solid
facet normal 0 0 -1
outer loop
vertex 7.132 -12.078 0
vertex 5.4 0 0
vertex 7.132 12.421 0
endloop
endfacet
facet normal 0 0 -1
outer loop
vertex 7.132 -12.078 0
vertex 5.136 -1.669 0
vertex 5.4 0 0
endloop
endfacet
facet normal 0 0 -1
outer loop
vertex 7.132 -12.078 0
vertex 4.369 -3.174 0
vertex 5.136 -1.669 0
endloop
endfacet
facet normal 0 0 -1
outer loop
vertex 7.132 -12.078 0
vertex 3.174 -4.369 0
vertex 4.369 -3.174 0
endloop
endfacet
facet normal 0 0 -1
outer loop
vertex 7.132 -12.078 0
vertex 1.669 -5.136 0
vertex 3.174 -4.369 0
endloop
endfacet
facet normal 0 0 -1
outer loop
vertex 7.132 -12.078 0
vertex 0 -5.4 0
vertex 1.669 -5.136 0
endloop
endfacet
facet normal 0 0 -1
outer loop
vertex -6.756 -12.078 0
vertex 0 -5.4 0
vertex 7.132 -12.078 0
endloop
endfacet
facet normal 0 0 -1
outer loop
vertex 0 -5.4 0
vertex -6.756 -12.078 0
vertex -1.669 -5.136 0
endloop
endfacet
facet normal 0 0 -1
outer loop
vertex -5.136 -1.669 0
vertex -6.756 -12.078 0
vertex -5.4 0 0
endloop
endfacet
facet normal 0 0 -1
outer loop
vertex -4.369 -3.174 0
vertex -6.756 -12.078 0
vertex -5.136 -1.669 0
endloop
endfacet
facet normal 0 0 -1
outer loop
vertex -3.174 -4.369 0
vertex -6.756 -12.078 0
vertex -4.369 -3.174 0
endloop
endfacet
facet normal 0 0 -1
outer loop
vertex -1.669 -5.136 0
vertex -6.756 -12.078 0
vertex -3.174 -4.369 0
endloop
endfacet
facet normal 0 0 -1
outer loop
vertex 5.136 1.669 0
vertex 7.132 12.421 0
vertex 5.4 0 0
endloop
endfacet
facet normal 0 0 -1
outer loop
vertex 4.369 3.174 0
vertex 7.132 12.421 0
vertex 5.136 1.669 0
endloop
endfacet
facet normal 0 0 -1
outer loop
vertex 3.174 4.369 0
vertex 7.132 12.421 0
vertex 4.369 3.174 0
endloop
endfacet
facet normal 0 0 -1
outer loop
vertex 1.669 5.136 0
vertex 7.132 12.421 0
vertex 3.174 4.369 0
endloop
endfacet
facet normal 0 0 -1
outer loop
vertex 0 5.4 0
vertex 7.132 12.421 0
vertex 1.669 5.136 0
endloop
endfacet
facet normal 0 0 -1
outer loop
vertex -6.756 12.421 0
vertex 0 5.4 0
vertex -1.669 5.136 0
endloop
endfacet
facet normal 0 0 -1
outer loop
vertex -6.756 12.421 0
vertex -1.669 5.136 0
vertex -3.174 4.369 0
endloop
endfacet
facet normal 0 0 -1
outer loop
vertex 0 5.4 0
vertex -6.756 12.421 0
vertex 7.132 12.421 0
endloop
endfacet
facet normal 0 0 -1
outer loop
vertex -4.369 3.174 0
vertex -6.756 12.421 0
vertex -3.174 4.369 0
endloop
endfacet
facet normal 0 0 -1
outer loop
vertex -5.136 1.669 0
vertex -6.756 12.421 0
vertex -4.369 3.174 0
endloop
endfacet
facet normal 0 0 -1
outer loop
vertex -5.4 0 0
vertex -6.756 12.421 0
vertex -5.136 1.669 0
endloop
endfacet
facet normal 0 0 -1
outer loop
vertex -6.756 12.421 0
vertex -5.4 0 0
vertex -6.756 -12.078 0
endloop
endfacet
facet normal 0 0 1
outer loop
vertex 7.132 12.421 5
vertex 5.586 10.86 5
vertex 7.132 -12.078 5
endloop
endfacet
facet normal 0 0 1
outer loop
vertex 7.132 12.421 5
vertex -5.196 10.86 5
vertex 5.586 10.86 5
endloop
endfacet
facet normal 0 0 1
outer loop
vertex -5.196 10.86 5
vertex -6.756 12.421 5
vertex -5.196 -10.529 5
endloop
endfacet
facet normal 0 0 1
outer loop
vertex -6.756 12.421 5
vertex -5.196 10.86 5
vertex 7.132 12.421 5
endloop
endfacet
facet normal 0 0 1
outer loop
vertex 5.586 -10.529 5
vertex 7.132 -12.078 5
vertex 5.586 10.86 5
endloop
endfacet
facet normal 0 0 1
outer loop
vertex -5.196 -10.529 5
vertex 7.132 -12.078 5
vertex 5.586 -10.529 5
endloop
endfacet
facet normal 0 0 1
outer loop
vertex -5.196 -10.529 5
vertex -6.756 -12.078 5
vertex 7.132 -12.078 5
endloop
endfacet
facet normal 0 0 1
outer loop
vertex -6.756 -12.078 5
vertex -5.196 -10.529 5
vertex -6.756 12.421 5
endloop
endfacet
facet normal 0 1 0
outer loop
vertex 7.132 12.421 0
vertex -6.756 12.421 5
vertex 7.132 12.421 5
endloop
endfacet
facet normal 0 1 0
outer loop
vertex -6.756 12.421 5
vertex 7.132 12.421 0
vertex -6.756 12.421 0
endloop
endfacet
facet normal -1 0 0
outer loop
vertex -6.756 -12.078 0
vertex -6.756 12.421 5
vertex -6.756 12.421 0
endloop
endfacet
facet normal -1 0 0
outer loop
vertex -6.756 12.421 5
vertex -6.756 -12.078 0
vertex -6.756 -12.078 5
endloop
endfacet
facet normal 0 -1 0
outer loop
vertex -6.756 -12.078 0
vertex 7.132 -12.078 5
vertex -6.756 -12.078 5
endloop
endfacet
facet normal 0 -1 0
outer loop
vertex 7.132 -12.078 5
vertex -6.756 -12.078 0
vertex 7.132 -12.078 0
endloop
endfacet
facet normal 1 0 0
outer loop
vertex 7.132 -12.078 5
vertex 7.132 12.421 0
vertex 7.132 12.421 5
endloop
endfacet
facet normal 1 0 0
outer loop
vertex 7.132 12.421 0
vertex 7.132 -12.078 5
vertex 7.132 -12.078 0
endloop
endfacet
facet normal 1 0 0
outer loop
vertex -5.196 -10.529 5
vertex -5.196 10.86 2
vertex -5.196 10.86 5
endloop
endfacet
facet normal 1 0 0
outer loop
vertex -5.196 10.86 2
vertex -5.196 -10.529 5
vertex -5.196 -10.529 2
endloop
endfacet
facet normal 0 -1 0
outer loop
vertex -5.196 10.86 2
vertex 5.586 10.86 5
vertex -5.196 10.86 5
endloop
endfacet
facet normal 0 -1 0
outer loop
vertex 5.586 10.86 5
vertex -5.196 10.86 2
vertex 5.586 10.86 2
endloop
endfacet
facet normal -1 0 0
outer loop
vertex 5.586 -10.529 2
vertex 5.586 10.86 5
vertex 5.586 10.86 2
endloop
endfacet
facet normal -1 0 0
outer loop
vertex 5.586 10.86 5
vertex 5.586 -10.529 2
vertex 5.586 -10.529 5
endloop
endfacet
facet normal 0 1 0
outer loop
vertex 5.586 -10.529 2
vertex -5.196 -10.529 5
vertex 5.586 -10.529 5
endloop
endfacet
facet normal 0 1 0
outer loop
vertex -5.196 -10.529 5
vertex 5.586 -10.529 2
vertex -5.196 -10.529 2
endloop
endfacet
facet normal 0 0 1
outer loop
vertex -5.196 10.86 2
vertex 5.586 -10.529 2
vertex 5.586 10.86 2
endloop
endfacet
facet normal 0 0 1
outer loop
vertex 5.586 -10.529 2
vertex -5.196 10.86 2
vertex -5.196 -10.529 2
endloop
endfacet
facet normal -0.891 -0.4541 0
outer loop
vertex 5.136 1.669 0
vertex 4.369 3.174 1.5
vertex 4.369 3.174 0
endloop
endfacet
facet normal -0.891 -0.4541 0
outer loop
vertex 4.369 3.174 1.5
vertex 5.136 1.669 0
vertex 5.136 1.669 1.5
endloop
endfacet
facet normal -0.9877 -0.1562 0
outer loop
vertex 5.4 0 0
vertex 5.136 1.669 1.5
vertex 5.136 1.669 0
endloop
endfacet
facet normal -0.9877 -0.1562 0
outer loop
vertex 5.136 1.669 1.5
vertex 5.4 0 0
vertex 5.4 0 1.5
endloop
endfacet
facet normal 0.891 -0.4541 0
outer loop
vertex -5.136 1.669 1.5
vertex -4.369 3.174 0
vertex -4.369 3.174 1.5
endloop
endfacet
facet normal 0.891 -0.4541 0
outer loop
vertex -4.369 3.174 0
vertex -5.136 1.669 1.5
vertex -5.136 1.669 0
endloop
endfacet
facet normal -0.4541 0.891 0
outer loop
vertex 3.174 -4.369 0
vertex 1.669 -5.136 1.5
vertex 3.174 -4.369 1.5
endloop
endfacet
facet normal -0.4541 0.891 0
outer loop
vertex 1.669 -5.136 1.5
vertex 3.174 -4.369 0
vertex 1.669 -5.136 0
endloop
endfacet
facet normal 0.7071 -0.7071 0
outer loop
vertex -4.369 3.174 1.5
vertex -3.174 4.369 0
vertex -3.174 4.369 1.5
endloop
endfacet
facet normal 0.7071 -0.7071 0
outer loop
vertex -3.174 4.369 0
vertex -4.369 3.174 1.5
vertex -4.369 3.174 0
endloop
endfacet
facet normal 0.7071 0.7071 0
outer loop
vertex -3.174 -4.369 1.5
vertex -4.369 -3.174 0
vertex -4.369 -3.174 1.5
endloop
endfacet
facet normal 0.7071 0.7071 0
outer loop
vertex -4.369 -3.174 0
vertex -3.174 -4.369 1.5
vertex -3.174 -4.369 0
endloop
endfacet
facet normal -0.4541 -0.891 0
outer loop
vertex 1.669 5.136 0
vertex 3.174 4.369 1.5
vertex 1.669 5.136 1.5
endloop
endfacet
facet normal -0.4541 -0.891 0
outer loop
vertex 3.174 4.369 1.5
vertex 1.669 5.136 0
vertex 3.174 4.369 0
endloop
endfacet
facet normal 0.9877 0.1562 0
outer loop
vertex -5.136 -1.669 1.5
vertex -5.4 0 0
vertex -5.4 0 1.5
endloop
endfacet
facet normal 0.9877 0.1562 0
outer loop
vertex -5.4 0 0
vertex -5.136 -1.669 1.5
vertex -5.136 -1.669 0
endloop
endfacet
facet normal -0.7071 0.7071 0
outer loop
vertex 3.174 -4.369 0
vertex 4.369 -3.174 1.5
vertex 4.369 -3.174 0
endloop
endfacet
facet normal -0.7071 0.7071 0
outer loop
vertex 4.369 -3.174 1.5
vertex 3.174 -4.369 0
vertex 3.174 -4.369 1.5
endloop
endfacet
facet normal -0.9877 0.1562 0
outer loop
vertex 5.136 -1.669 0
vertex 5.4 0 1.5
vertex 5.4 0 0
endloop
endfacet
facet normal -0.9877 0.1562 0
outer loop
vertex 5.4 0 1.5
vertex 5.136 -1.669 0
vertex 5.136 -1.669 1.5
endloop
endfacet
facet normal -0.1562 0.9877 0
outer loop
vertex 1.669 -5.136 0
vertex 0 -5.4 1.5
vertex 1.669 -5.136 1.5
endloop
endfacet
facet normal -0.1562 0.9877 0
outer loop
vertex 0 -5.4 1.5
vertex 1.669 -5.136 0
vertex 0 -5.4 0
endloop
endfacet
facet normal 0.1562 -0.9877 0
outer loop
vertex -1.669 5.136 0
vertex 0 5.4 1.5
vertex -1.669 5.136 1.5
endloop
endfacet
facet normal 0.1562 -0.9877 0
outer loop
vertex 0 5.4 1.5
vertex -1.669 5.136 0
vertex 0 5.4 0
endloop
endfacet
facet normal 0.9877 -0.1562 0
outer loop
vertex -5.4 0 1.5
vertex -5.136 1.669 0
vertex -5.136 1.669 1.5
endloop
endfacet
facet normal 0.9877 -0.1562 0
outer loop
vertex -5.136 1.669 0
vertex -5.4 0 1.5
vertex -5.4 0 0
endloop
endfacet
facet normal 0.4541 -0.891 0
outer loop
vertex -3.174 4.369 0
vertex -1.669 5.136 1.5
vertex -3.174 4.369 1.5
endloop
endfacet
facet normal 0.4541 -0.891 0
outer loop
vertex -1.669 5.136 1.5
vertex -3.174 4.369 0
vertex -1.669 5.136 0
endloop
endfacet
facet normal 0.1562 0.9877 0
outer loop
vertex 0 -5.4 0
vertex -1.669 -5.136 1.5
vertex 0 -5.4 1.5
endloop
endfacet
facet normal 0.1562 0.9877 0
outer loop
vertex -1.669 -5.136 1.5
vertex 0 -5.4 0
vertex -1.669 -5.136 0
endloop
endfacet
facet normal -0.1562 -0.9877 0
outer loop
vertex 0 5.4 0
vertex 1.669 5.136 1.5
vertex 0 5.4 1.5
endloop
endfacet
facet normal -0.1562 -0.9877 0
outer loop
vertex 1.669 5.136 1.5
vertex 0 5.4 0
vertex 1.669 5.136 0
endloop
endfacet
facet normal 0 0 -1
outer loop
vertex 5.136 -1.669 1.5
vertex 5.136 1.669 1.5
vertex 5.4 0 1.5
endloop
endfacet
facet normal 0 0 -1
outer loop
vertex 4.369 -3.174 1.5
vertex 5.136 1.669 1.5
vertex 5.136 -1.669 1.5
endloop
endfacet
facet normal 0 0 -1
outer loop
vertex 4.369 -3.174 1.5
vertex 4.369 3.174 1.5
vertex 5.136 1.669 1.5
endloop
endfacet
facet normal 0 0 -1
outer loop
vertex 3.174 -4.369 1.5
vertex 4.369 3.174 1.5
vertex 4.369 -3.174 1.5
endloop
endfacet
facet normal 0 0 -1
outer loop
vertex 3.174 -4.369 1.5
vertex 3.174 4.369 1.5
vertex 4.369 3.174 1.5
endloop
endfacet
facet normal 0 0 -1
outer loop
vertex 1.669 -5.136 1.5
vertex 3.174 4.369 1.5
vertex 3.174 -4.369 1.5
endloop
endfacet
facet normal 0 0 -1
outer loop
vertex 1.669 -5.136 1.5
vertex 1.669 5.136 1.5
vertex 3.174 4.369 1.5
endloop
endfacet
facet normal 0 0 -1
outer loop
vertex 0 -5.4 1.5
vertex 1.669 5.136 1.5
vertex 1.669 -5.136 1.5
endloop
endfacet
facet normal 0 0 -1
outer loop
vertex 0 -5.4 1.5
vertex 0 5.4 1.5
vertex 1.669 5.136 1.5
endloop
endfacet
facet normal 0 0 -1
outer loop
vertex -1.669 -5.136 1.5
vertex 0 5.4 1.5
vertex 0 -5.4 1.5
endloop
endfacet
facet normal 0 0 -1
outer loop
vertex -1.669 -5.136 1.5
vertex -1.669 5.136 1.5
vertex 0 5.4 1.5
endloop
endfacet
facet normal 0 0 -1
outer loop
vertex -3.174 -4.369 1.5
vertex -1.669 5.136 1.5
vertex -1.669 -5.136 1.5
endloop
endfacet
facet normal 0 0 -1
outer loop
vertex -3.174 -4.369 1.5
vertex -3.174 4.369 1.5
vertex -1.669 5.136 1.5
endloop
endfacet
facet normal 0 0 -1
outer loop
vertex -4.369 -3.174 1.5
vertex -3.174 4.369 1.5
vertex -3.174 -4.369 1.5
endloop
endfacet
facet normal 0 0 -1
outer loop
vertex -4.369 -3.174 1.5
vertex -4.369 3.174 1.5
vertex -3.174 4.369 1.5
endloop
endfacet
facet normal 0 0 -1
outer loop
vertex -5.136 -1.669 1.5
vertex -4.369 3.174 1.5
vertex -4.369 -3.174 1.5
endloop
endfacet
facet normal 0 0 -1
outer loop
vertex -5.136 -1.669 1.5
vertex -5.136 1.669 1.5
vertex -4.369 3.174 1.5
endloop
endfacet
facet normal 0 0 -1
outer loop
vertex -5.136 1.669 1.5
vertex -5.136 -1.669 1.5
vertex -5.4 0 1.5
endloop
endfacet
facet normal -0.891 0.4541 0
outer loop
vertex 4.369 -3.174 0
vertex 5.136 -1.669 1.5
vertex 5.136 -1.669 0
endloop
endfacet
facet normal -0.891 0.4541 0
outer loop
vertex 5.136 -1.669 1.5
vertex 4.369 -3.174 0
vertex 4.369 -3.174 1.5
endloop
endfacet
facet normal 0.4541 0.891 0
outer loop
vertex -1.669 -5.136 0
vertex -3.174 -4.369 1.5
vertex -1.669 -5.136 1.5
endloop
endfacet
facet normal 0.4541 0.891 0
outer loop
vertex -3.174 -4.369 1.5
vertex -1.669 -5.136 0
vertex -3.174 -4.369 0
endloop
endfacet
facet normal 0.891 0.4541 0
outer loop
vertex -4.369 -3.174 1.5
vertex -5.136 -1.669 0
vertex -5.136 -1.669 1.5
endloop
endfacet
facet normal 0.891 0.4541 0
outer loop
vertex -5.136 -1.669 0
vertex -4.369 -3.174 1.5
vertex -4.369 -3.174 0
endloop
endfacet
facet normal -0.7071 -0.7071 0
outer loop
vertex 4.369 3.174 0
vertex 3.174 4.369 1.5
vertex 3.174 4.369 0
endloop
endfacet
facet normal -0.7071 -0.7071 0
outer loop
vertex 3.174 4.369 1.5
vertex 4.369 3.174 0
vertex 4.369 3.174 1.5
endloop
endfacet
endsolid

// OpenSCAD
//FONT AWESOME FRIDGE MAGNETS
// get your icons here: http://fortawesome.github.io/Font-Awesome/cheatsheet/
//tutorial on how to install fontawesome here: https://www.youtube.com/watch?v=napby3wUZnw
resolution					=	100;
icon								=	"";
inverse						=	"false";

size								= 20;
thickness					=	5;
magnet_size				= 10.8;
magnet_thickness		= 1.5;

//magnet grid settings
spacing						= 15;
rows							= 1;
columes						= 1;

magnet_shape			= "circle"; //circle or square
flat_plate_behind		= "true"; //this might be needed for some icons that have loose parts 
flat_plate_thickness	= 2;

//if magnet shape is square
magnet_width			= 4;
magnet_height			= 4;







//code stuff that you dont need to worry about unless you know what you are doing

$fn= resolution;
module inverse(){
	if(inverse == "true"){
		difference(){
			hull(){
				icon();
			}
			icon();
		}
	}
}

module icon(){
	linear_extrude(height = thickness) {
		   text(text = icon, font = "fontawesome", size = size, halign = "center", valign = "center");
	}
}

module magnet(){
	if (inverse == "true"){
		inverse();
	} else {
		icon();
	}
	
	if(flat_plate_behind == "true"){
		color("black") {
			hull(){
				linear_extrude(height = flat_plate_thickness) {
					   text( text = icon, font = "fontawesome", size = size, halign = "center", valign = "center");
				}
			}
		}
	}
}
module real_individual_magnet(){
	if (magnet_shape == "square"){
		translate([0,0,magnet_thickness/2]) cube([magnet_width,magnet_height,magnet_thickness],center=true);
	} else {
		cylinder(d=magnet_size, h=magnet_thickness, $fn=20);
	}
}

module real_magnets(){
	rows =  rows -1;
	for ( i = [-rows/2 : rows/2] ){
		columes = columes -1;
		translate([0,i*spacing,0]) for ( i = [-columes/2 : columes/2] ){
			translate([i*spacing,0,0]) real_individual_magnet();
		}
	}
}

difference(){
	magnet();
	real_magnets();
}
